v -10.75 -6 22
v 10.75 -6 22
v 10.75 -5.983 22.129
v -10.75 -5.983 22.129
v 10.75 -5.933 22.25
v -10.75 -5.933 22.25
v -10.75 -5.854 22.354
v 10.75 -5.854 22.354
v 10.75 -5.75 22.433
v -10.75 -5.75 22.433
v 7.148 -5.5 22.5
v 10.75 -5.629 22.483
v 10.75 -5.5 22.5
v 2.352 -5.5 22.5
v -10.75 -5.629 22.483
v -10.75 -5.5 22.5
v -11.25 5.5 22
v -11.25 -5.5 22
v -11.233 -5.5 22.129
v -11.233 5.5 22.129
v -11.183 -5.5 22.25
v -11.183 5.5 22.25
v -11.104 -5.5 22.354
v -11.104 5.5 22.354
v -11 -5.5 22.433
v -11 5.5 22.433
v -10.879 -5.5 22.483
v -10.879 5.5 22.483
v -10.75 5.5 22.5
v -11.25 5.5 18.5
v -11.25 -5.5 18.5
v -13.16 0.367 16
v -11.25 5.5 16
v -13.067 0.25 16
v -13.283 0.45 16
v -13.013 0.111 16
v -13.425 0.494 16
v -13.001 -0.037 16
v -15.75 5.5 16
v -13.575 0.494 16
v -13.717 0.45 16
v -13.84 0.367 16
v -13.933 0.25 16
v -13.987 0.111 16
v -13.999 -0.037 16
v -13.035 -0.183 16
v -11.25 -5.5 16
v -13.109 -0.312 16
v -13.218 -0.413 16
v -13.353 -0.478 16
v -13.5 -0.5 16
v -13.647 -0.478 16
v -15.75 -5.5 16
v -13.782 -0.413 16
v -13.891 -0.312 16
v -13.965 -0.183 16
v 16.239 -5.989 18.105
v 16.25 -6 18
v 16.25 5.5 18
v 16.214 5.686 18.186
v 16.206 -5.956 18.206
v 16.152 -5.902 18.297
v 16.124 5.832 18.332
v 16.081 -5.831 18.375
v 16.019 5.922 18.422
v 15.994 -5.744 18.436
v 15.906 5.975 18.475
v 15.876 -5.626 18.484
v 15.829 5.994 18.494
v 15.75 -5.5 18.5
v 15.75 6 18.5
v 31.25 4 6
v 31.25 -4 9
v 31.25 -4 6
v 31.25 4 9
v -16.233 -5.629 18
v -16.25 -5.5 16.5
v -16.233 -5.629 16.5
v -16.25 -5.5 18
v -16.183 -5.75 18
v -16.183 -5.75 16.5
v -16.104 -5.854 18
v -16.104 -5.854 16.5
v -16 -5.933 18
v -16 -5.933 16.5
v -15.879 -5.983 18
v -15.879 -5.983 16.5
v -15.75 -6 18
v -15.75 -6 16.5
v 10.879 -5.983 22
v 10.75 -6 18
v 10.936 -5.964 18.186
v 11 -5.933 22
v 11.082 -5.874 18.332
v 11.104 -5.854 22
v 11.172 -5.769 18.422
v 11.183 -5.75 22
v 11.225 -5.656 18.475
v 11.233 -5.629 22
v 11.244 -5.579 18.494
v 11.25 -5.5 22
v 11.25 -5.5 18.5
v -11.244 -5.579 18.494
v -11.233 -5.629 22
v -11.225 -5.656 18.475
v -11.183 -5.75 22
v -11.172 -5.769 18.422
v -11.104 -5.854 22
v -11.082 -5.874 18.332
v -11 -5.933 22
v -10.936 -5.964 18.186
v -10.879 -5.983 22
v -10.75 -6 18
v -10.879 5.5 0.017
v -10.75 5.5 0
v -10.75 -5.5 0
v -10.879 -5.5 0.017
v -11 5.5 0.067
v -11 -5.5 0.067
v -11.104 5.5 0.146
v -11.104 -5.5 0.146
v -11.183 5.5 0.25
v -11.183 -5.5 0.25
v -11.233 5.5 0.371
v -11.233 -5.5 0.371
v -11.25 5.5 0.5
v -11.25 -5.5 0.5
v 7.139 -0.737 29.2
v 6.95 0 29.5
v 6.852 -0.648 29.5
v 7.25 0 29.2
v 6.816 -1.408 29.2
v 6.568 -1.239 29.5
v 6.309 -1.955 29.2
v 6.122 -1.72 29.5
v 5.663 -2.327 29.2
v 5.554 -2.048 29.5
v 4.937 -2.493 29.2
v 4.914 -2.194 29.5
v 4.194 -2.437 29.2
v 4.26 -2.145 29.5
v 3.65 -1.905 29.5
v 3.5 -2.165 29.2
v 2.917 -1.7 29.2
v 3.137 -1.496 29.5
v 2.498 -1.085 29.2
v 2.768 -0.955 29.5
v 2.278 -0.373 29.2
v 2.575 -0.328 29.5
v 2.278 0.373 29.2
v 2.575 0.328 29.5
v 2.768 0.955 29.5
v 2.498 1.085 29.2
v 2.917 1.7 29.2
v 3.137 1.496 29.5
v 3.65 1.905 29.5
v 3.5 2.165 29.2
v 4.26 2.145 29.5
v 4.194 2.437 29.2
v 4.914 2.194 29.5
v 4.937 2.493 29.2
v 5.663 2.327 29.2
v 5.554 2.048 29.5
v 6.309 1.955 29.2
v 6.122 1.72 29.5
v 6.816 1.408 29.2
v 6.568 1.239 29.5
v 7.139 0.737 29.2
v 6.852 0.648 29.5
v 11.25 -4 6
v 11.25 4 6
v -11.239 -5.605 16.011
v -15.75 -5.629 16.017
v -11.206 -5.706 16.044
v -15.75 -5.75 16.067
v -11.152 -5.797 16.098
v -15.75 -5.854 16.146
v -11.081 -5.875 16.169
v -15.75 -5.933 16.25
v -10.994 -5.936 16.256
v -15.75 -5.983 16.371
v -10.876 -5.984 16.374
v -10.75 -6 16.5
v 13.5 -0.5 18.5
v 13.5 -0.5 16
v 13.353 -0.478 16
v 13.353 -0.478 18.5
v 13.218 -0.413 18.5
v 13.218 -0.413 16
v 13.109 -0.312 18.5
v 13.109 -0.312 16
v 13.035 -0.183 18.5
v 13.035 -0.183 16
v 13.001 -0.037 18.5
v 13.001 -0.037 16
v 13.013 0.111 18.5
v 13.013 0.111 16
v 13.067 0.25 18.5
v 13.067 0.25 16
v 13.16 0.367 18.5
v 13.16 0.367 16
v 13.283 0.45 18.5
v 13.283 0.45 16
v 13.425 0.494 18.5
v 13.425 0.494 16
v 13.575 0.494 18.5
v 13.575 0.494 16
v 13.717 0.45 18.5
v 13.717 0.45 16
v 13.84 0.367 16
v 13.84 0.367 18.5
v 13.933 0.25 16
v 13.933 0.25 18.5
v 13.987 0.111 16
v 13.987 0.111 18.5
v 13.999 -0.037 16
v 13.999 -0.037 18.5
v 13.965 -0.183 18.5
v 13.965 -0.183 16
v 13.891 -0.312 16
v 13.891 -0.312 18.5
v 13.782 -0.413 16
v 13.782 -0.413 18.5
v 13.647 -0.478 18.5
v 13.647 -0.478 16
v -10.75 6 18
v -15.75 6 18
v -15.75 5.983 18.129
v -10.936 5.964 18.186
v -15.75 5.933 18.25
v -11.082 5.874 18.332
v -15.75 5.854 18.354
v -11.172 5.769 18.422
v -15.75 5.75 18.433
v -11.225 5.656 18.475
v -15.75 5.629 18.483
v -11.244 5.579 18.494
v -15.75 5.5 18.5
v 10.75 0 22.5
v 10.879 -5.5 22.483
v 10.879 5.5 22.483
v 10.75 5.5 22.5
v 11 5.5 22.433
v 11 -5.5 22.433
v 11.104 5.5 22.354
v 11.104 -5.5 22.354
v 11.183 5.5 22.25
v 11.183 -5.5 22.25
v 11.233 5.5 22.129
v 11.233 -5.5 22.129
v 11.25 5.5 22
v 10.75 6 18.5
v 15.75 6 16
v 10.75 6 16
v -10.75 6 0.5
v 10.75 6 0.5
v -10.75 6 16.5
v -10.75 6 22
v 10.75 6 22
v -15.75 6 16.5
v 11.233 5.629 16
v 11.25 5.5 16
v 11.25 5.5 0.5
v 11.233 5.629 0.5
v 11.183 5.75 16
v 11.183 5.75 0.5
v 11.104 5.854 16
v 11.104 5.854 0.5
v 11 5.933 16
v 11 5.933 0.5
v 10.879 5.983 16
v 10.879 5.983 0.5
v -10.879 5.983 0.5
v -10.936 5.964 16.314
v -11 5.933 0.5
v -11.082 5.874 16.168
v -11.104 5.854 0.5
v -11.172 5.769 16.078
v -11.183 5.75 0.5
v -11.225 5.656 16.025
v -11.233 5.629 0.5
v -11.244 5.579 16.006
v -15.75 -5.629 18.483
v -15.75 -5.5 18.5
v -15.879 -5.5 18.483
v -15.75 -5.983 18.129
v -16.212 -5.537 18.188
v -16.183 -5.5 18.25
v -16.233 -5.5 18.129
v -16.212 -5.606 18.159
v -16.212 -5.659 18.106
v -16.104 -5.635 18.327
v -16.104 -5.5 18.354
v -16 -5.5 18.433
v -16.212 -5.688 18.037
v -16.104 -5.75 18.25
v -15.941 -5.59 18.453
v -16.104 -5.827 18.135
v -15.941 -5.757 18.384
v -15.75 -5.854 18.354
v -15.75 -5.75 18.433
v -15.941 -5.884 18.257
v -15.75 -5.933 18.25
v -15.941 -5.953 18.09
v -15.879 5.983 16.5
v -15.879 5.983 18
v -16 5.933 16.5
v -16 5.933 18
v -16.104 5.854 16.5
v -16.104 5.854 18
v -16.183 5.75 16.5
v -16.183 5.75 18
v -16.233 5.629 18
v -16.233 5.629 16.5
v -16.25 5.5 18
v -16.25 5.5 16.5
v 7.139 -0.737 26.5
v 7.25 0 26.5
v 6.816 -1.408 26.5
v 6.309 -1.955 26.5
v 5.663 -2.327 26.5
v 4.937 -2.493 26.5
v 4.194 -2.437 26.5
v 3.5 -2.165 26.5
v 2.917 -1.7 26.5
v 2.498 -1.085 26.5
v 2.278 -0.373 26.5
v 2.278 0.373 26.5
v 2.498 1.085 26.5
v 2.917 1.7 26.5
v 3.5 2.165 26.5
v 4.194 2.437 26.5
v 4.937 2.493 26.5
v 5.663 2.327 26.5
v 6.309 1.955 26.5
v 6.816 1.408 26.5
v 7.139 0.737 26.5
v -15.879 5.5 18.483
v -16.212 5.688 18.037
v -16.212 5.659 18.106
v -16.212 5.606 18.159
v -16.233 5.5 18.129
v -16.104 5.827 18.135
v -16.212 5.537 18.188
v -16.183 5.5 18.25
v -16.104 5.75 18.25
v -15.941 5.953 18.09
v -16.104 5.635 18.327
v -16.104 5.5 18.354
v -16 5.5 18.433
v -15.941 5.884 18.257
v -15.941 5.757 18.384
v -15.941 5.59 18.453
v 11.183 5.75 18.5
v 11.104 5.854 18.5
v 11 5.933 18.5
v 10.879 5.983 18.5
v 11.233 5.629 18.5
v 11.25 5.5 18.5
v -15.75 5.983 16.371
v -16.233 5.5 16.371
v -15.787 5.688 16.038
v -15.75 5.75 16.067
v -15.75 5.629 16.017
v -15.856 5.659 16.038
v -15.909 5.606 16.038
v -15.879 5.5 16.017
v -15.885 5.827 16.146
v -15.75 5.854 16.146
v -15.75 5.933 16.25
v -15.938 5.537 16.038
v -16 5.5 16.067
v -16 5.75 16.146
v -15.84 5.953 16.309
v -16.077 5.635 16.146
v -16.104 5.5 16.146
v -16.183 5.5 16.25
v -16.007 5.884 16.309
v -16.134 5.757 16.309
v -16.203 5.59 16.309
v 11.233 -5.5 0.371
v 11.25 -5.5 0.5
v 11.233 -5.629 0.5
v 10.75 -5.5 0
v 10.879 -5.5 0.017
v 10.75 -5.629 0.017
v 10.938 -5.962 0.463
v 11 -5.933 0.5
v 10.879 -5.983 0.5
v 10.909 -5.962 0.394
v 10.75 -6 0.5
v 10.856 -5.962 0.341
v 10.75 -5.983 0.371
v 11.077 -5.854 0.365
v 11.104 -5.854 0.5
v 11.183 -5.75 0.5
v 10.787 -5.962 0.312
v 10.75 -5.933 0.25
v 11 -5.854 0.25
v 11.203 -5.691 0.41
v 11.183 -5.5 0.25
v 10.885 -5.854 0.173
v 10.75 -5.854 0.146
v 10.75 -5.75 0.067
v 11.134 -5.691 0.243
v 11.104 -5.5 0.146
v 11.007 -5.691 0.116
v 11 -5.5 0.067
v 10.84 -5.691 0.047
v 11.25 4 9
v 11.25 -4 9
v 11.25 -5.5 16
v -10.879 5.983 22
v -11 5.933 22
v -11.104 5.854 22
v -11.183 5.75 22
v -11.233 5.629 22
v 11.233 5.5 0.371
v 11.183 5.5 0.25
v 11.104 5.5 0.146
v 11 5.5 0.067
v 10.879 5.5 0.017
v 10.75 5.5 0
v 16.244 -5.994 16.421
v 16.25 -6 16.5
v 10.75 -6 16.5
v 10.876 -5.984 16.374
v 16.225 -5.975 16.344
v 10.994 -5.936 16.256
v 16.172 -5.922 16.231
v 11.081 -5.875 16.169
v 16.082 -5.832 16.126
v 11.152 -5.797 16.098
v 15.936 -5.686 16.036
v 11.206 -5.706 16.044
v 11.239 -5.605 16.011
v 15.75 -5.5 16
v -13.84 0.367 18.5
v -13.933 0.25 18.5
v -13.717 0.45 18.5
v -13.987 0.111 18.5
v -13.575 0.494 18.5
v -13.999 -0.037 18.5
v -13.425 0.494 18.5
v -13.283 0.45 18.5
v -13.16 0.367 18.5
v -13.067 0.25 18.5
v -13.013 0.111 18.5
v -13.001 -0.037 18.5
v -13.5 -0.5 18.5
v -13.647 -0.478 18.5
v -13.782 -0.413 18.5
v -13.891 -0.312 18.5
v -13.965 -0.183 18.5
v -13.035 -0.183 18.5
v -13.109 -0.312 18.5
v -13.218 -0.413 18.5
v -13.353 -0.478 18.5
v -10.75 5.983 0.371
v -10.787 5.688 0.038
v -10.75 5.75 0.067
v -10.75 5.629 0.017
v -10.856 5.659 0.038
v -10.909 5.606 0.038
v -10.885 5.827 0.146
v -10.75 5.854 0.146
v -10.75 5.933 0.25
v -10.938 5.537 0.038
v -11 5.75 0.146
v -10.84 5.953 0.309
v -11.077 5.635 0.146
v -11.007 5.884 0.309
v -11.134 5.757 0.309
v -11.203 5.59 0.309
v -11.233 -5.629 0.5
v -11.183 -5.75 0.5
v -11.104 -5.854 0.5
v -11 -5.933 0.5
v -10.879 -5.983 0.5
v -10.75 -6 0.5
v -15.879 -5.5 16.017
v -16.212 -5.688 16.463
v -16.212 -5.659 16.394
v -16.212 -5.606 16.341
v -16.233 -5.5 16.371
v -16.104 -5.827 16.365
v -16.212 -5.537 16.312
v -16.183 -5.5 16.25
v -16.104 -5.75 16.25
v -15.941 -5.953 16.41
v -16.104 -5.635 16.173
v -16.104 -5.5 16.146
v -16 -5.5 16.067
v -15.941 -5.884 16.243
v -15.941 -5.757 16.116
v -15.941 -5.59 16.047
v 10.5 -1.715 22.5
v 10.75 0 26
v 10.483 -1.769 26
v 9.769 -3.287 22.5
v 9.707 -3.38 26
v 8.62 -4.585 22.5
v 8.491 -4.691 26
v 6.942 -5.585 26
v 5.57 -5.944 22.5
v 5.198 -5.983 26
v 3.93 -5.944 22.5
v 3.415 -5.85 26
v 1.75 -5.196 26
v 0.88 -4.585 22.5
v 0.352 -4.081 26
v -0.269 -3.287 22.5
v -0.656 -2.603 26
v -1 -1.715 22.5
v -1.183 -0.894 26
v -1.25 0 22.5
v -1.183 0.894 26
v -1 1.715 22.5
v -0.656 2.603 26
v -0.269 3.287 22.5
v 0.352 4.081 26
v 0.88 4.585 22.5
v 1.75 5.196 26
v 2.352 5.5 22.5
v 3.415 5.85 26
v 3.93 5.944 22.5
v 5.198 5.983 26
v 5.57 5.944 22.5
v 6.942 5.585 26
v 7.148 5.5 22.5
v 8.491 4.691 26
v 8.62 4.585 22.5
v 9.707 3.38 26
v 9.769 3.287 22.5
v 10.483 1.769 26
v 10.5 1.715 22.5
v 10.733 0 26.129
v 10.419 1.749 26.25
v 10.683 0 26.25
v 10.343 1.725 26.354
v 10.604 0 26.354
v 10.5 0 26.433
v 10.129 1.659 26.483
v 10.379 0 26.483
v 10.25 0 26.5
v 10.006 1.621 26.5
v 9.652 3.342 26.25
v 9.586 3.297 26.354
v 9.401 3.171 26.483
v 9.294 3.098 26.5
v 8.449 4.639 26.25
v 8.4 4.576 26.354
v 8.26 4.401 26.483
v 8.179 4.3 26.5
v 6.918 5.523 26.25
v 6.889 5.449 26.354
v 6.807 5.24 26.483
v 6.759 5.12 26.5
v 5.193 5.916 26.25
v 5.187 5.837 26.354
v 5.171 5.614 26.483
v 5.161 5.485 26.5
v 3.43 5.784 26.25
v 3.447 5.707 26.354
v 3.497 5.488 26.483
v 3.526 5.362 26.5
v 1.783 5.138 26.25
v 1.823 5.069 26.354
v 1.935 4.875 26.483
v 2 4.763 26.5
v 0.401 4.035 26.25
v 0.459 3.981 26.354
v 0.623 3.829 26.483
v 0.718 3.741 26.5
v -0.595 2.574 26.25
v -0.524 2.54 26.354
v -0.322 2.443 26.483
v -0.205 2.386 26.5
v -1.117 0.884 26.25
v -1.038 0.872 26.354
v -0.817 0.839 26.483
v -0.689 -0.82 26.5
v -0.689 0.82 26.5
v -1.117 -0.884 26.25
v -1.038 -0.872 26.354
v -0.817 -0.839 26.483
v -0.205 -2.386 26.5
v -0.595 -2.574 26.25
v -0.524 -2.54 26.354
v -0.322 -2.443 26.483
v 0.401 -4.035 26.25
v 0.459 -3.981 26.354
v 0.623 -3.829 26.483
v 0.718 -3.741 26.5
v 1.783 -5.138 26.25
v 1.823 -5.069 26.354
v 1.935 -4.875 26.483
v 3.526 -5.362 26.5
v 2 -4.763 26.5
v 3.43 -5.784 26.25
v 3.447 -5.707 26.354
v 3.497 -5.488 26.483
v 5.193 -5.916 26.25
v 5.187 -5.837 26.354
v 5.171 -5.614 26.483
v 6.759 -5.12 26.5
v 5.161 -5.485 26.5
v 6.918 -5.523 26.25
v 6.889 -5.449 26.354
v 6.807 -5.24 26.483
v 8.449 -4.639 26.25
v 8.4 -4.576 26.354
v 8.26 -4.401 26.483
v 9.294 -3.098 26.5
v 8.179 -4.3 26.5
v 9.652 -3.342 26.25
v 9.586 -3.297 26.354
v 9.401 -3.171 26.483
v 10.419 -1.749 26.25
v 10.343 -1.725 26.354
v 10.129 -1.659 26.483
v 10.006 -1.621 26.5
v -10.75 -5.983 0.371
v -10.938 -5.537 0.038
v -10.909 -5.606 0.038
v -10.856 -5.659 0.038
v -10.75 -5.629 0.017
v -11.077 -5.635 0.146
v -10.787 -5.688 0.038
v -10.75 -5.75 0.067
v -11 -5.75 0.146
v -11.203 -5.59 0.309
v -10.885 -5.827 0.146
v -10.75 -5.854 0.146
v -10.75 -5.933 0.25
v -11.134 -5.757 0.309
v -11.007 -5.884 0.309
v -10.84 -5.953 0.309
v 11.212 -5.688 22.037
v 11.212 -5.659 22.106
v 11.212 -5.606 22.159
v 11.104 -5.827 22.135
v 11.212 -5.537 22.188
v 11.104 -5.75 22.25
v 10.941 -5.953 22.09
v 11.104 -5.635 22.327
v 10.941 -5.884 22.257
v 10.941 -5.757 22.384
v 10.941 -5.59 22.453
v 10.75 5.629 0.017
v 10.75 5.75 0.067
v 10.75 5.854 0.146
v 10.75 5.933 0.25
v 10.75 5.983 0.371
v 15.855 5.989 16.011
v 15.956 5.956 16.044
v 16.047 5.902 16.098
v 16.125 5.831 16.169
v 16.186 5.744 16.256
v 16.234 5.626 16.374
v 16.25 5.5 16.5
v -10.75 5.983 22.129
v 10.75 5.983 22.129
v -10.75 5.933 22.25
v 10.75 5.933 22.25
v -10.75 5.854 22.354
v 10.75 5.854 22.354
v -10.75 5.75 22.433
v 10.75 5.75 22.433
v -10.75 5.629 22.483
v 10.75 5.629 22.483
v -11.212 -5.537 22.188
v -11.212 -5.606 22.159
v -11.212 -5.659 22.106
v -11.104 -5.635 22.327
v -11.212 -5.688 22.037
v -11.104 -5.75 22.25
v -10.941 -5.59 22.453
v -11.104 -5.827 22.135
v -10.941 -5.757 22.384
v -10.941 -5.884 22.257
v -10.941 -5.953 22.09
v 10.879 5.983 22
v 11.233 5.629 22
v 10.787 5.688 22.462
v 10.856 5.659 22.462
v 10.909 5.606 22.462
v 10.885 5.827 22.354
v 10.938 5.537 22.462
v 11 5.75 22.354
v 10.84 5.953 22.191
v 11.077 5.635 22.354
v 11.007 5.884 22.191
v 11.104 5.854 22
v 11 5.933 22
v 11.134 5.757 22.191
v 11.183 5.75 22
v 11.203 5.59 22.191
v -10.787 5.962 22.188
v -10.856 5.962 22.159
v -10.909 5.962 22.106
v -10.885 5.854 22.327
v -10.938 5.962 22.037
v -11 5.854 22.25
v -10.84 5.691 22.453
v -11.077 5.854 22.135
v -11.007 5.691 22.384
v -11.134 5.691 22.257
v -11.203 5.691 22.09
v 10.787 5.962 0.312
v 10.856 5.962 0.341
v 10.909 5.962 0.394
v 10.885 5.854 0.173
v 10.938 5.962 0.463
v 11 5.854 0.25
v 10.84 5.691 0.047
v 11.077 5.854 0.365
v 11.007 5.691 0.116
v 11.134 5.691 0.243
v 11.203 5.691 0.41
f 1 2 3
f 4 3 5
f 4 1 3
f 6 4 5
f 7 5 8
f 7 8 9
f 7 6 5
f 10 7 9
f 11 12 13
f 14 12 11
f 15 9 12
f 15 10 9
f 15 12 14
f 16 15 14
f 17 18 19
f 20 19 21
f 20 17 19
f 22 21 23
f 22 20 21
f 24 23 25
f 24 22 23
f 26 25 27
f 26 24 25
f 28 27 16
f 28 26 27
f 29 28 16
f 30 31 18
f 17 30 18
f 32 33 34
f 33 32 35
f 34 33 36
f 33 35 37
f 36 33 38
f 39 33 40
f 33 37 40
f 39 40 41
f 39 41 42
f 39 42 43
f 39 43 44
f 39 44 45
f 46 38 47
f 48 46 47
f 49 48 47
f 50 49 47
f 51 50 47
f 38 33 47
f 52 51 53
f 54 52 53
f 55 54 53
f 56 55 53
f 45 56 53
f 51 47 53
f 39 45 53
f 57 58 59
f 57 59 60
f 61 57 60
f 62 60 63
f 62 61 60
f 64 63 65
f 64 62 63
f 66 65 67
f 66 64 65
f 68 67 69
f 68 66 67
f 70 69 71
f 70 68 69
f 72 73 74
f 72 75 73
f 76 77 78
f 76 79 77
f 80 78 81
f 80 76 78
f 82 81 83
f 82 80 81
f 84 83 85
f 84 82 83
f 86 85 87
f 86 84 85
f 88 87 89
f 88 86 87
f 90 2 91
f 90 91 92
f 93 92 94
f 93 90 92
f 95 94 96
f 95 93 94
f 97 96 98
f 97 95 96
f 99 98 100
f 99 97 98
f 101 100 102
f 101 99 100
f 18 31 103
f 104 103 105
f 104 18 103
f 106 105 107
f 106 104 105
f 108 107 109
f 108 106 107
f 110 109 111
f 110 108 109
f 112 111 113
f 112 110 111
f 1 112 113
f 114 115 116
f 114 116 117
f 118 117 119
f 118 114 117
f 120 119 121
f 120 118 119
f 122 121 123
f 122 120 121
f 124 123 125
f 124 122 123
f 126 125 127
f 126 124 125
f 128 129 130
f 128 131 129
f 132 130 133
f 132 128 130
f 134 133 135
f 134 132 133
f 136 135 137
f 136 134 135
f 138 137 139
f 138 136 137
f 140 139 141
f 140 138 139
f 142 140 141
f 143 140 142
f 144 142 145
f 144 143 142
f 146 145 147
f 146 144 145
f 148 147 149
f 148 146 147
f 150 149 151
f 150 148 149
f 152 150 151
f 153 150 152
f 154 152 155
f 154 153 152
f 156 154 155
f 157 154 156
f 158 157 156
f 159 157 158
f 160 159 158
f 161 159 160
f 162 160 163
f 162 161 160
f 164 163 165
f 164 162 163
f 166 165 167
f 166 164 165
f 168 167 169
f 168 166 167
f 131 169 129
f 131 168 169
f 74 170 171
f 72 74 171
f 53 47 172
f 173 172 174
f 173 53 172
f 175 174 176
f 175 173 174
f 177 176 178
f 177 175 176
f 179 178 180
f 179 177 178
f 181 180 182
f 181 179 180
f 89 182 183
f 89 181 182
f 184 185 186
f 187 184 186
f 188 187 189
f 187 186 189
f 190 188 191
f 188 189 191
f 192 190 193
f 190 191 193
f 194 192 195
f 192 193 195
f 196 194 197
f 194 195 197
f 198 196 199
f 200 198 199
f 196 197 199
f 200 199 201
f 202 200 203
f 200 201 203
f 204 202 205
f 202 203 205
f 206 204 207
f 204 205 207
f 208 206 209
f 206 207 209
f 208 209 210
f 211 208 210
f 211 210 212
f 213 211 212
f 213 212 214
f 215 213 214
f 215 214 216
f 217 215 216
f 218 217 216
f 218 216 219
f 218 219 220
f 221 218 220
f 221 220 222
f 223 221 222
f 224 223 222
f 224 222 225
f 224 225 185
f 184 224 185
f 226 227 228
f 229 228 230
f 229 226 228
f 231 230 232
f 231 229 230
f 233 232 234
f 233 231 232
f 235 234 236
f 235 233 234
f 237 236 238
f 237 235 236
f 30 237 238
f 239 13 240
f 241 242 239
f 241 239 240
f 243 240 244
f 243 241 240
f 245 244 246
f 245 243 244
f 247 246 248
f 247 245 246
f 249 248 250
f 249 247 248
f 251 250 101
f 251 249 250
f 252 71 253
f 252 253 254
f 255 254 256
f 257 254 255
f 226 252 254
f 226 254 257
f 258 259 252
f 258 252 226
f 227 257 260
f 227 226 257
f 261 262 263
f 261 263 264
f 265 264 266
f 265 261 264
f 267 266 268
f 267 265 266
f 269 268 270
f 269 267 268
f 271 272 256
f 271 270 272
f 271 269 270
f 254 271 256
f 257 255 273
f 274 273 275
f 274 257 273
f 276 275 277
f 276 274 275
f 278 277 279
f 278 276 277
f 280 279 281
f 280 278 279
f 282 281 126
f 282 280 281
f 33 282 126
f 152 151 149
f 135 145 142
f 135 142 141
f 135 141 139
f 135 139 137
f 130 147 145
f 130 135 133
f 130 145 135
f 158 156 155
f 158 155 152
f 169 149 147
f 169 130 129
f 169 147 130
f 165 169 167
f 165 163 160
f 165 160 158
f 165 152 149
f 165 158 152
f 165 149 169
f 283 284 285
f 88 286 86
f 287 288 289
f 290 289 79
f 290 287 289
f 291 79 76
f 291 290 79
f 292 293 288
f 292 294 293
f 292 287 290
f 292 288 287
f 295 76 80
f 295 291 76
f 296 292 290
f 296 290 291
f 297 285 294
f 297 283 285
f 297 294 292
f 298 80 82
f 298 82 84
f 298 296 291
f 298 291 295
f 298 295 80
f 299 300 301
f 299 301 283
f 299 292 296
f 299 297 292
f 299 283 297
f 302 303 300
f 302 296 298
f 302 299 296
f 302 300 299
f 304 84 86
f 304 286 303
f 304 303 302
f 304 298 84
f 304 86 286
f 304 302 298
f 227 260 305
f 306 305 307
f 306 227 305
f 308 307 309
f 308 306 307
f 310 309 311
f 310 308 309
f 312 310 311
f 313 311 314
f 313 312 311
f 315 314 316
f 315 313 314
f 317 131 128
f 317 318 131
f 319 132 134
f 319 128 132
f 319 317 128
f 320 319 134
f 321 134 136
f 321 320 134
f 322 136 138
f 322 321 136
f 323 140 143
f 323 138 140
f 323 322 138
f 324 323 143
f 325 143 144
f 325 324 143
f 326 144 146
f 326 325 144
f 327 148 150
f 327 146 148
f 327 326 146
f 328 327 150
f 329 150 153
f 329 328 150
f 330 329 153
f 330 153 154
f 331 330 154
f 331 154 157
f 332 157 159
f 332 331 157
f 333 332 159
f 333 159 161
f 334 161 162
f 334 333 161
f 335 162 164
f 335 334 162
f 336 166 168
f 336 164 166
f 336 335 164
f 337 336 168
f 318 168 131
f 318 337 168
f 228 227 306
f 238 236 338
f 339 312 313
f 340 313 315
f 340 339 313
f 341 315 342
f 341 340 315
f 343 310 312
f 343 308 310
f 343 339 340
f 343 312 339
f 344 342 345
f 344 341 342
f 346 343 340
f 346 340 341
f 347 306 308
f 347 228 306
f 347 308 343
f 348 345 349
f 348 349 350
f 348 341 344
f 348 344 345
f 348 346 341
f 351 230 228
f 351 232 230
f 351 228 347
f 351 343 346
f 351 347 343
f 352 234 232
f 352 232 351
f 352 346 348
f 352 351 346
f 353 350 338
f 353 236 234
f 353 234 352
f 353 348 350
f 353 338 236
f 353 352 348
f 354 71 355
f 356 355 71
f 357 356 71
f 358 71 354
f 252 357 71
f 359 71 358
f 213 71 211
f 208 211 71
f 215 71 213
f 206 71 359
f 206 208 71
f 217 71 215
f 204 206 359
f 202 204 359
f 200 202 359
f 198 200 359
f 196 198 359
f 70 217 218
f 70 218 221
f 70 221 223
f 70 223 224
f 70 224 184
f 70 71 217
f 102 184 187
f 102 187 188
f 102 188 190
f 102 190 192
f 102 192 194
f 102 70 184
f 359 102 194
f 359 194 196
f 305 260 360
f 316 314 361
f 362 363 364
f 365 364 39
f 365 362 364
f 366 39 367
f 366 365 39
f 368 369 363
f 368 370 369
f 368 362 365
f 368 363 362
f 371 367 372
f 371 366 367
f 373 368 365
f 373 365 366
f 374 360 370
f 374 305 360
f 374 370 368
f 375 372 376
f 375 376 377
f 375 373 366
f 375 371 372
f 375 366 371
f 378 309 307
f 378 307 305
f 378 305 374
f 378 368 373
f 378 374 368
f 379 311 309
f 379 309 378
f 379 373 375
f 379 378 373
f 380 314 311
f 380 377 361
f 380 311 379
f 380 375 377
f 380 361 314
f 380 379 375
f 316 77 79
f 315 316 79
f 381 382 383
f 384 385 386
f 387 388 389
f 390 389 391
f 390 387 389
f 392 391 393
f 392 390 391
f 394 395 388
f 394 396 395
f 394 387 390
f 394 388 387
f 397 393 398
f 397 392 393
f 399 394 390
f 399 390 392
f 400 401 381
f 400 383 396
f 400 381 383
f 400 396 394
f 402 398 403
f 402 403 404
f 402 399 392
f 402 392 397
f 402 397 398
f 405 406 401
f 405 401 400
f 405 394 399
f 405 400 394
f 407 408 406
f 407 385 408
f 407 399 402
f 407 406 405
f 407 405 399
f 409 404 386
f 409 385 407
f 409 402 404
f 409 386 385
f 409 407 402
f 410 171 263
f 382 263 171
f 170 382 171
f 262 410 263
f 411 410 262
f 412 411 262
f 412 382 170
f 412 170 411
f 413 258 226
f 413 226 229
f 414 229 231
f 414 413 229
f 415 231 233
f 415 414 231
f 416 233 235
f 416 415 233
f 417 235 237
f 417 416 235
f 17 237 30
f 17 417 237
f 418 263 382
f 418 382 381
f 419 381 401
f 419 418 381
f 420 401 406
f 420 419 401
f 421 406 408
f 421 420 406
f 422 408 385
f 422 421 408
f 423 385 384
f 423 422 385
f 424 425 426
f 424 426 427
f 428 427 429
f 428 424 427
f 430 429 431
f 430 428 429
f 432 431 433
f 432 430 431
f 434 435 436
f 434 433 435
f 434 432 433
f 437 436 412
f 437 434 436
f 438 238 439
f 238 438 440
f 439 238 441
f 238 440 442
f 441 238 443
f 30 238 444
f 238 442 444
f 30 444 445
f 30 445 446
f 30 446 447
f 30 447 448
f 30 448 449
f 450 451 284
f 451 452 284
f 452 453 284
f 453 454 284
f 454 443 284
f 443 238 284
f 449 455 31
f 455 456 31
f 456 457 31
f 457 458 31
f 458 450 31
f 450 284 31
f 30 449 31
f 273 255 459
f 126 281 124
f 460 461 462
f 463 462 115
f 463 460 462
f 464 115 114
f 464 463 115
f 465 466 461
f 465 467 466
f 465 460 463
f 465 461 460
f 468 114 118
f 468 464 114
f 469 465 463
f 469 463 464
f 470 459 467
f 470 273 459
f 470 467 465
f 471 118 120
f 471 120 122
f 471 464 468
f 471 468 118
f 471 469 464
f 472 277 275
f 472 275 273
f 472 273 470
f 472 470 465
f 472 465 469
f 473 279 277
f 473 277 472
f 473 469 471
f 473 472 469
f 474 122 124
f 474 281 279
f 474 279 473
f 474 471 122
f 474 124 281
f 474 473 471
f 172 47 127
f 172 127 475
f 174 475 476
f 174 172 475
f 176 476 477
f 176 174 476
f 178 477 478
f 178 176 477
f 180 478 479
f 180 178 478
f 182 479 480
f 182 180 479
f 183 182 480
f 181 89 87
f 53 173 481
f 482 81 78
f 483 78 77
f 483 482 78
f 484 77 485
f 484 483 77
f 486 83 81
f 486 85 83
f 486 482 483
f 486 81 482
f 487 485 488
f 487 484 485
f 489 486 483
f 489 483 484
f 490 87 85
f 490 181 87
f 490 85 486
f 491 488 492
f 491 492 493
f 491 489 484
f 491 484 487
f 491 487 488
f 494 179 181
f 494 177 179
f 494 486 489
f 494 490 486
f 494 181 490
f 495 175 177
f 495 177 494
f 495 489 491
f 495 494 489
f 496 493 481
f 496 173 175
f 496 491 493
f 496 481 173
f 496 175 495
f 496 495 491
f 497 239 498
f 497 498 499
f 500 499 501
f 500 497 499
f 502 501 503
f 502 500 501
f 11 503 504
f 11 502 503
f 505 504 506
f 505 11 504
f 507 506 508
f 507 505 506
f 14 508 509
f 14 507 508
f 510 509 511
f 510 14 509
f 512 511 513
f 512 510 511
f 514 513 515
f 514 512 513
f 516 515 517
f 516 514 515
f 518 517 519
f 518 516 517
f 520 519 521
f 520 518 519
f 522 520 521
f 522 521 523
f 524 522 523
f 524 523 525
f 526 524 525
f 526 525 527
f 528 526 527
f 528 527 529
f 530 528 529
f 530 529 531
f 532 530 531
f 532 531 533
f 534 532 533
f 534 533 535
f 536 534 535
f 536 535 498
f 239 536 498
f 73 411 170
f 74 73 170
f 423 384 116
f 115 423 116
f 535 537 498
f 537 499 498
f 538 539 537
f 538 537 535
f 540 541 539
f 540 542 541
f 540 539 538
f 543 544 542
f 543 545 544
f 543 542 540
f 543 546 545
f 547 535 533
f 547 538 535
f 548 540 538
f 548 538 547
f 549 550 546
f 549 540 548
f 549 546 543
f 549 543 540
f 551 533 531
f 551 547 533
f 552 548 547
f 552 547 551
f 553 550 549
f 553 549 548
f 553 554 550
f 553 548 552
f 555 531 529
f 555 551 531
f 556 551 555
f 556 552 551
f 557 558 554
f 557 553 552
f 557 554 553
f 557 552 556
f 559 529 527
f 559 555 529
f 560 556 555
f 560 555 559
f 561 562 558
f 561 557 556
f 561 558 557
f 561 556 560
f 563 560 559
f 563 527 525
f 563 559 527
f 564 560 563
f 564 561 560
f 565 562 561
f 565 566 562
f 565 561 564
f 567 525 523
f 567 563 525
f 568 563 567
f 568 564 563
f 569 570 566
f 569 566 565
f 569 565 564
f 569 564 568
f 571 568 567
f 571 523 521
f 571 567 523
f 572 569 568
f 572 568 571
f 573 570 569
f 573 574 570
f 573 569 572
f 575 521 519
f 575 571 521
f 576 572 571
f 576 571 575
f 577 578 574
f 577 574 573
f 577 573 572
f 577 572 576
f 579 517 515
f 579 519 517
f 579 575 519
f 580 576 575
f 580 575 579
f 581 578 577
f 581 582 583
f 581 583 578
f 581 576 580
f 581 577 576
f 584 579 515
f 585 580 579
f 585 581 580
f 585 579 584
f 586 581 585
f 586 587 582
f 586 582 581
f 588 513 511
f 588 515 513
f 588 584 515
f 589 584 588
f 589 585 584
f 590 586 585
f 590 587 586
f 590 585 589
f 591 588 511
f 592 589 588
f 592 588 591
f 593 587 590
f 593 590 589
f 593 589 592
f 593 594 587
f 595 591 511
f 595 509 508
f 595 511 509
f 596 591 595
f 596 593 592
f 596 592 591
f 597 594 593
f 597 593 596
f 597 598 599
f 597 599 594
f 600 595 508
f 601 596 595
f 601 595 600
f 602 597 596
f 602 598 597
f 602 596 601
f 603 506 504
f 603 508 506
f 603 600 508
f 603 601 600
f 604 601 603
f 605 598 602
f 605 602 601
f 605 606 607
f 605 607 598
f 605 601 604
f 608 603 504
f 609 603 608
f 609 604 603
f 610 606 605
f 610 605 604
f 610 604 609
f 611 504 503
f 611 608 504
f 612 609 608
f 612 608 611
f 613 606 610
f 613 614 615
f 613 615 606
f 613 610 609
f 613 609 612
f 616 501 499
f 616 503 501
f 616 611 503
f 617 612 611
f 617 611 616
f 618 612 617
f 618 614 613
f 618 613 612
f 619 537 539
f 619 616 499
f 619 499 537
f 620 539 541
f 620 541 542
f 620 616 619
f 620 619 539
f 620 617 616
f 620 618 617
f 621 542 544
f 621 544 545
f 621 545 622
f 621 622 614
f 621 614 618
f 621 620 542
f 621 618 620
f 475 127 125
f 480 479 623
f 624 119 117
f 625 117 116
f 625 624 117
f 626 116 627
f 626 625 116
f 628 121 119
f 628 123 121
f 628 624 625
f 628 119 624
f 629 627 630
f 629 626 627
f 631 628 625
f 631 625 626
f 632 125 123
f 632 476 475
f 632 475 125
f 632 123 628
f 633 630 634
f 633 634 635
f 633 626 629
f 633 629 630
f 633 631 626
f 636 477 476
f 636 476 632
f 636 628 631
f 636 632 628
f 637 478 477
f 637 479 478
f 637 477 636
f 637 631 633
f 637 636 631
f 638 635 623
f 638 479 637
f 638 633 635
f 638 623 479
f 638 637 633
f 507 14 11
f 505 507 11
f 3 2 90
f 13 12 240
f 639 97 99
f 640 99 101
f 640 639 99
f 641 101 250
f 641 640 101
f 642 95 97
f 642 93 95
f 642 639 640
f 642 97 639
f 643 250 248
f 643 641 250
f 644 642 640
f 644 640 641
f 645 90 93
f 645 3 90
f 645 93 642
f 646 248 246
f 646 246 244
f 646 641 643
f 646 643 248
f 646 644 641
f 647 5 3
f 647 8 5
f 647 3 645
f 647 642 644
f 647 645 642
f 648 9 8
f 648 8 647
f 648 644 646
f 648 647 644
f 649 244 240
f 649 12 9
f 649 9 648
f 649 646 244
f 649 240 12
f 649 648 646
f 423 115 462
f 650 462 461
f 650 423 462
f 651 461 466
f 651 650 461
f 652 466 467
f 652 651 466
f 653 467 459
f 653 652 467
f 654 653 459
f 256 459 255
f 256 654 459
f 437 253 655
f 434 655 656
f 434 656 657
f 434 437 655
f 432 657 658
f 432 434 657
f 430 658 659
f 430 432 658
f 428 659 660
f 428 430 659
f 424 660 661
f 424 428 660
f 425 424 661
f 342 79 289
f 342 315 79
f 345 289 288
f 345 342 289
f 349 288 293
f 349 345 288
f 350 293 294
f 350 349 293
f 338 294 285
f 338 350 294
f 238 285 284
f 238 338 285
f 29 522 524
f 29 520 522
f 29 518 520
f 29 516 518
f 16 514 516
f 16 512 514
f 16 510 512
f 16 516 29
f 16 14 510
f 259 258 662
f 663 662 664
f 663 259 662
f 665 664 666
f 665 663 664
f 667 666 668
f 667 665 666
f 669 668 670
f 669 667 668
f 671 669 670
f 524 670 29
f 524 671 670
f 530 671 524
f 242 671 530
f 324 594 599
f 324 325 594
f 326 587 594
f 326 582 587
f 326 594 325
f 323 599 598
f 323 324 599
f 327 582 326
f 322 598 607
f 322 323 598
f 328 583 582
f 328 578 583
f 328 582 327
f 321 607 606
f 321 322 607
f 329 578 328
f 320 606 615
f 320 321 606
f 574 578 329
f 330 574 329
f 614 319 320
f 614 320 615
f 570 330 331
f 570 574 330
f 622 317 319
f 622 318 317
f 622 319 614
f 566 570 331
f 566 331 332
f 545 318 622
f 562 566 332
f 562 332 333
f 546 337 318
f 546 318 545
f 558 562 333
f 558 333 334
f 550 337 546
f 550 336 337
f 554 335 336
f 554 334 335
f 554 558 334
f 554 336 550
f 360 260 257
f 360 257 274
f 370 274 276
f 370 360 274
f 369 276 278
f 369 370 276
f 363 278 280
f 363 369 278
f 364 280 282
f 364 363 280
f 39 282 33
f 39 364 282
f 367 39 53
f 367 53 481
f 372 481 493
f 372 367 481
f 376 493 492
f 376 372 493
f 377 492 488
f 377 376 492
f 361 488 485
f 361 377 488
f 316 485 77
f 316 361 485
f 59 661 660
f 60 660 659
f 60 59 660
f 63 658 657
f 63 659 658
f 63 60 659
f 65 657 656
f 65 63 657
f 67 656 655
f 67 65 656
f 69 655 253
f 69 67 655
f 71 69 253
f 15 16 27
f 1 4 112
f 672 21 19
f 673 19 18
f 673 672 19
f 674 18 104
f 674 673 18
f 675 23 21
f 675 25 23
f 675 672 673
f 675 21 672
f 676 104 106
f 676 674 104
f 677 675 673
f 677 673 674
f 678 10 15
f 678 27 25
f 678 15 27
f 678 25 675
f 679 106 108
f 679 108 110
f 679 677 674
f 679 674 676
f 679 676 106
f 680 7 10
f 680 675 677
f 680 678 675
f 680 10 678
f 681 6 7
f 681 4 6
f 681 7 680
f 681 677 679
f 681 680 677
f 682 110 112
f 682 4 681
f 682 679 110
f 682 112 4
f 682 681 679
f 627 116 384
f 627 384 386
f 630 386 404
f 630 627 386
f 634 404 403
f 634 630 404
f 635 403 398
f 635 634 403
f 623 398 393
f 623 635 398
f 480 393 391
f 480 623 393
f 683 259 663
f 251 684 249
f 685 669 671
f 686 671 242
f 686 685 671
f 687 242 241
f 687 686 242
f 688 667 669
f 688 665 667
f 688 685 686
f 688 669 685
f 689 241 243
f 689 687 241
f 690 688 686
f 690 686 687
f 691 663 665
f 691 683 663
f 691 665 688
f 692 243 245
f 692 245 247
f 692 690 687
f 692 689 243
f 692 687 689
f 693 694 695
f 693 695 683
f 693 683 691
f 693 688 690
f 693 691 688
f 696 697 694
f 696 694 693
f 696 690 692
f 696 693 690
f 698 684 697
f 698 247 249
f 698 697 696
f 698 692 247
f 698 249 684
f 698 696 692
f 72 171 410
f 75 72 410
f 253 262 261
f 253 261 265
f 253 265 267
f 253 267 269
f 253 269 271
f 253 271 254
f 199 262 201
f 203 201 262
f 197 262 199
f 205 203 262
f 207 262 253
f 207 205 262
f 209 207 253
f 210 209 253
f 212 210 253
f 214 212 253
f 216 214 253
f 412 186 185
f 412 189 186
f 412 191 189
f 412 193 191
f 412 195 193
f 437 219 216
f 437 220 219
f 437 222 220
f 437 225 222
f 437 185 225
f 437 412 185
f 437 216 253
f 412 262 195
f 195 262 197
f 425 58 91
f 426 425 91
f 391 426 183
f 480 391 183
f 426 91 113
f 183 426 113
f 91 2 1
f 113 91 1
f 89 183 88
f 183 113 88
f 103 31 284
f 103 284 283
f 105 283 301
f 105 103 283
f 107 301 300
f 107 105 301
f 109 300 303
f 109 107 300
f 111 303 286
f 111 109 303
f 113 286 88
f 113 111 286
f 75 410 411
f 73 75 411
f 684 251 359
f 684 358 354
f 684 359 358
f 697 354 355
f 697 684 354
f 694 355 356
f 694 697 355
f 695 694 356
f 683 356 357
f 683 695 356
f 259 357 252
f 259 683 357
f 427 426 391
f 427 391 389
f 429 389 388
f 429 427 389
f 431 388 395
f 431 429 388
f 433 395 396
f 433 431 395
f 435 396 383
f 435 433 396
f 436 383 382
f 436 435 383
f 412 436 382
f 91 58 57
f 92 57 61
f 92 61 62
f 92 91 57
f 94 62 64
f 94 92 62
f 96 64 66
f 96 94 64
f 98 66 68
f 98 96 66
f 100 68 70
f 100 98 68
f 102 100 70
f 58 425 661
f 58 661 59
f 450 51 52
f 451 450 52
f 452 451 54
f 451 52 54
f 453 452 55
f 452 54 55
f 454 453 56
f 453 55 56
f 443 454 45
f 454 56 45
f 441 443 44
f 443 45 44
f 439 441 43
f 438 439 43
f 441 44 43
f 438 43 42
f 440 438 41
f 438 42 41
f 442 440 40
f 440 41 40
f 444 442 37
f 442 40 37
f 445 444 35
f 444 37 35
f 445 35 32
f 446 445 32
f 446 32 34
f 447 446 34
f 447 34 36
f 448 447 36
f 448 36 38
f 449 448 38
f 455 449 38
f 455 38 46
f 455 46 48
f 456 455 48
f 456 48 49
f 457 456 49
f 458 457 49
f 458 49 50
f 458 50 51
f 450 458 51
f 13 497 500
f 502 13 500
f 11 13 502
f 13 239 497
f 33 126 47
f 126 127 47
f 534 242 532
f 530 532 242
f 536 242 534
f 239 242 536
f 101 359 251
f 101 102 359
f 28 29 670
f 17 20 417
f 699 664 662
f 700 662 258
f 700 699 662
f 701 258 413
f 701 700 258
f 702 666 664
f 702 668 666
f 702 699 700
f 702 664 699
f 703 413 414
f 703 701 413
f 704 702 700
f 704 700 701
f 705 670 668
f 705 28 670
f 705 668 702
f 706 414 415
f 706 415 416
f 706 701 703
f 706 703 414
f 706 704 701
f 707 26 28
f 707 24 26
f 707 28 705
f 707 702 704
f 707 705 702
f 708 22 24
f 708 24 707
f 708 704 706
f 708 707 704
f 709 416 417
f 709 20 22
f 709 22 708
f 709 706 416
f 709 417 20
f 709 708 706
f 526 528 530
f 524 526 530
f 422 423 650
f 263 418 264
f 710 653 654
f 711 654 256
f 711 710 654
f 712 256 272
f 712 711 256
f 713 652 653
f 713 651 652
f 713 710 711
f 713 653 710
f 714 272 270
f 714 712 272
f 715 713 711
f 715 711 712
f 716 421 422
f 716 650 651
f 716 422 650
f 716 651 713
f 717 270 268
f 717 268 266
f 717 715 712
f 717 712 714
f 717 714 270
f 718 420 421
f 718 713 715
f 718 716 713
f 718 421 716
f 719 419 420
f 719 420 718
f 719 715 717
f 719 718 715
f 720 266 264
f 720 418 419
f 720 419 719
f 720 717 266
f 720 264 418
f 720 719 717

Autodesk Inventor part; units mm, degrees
ref_plane "YZ Plane" through (0, 0, 0) normal (1, 0, 0) x (0, 1, 0)
ref_plane "XZ Plane" through (0, 0, 0) normal (0, 1, 0) x (-1, 0, 0)
ref_plane "XY Plane" through (0, 0, 0) normal (0, 0, 1) x (1, 0, 0)
sketch "Skizze1" plane through (0, 0, 0) normal (0, 1, 0) x (-1, 0, 0)
  line L0 (-11.25, 0) -> (11.25, 0)
  line L1 (11.25, 0) -> (11.25, 16)
  line L2 (11.25, 16) -> (16.25, 16)
  line L3 (16.25, 16) -> (16.25, 18.5)
  line L4 (16.25, 18.5) -> (11.25, 18.5)
  line L5 (11.25, 18.5) -> (11.25, 22.5)
  line L6 (11.25, 22.5) -> (0, 22.5)
  line L7 (0, -4.5) -> (0, 27) projected
  line L8 (-11.25, 0) -> (-11.25, 16)
  line L9 (-11.25, 16) -> (-16.25, 16)
  line L10 (-16.25, 16) -> (-16.25, 18.5)
  line L11 (-16.25, 18.5) -> (-11.25, 18.5)
  line L12 (-11.25, 18.5) -> (-11.25, 22.5)
  line L13 (-11.25, 22.5) -> (0, 22.5)
  point P0 (0, 0)
  dimension "d0" = 22.5
  dimension "d1" = 16
  dimension "d2" = 5
  dimension "d3" = 2.5
  dimension "d4" = 4
  dimension "d5" = 0
extrude "Extrusion1" add sketch "Skizze1" along normal mid plane 12
fillet "Rundung1" radius 0.5 29 edges at (0, -6, 22.5) (11.25, 0, 0) (11.25, -6, 8) (11.25, -6, 20.5) (11.25, 6, 20.5) (-11.25, 0, 22.5) (11.25, 0, 22.5) (0, 6, 22.5) (-11.25, -6, 8) (-11.25, -6, 20.5) (-13.75, -6, 18.5) (-13.75, -6, 16) (-16.25, -6, 17.25) (13.75, -6, 18.5) (13.75, -6, 16) (16.25, 0, 16) (16.25, 0, 18.5) (16.25, 6, 17.25) (11.25, 6, 8) (-11.25, 6, 20.5) (-13.75, 6, 18.5) (-16.25, 6, 17.25) (-16.25, 0, 18.5) (-16.25, 0, 16) (-13.75, 6, 16) (-11.25, 6, 8) (-11.25, 0, 0) (0, 6, 0) (0, -6, 0)
sketch "Skizze2" plane through (-10.75, 5.5, 22.5) normal (0, 0, 1) x (1, 0, 0)
  circle A0 centre (15.5, -5.5) radius 6
  line L0 (21.5, 0) -> (21.5, -11) projected
  line L1 (21.5, 0.5) -> (0, 0.5) projected
  point P0 (10.75, -5.5)
  point P1 (21.5, -5.5)
  point P2 (21.5, -5.5)
  dimension "d9" = 6
extrude "Extrusion2" add sketch "Skizze2" along normal blind 4
sketch "Skizze3" plane through (4.75, 0, 26.5) normal (0, 0, 1) x (1, 0, 0)
  circle A0 centre (0, 0) radius 2.5
  arc A1 (2.3979, 5.5) -> (-2.3979, 5.5) centre (0, 0) ccw projected
  point P0 (0, 6)
  point P1 (6, 0)
  dimension "d14" = 5
extrude "Extrusion3" add sketch "Skizze3" along normal blind 3
fillet "Rundung2" radius 0.5 1 edges at (-1.25, 0, 26.5)
chamfer "Fasen1" distance 0.3 angle 45 1 edges at (2.25, 0, 29.5)
sketch "Skizze4" plane through (11.25, -5.5, 0.5) normal (1, 0, 0) x (0, 0, -1)
  line L0 (-8.5, 1.5) -> (-5.5, 1.5)
  line L1 (-5.5, 1.5) -> (-5.5, 9.5)
  line L2 (-5.5, 9.5) -> (-8.5, 9.5)
  line L3 (-8.5, 9.5) -> (-8.5, 1.5)
  line L4 (0.5, 0) -> (0.5, 11) projected
  point P0 (0.5, 5.5)
  point P1 (-5.5, 5.5)
  point P2 (0.5, 5.5)
  dimension "d21" = 8
  dimension "d22" = 3
  dimension "d23" = 6
extrude "Extrusion4" add sketch "Skizze4" along normal blind 20
sketch "Skizze5" plane through (10.75, 6, 18.5) normal (0, 0, 1) x (1, 0, 0)
  circle A0 centre (-6, -6) radius 2.2 projected
  line L0 (-26.5, -0.5) -> (-22, -0.5) projected
  point P0 (-10.75, -6)
  point P1 (2.75, -6)
  point P2 (-24.25, -6)
  point P3 (-24.25, -0.5)
  dimension "d26" = 27
hole "Bohrung1" at (13.5, 0, 18.5) at (-13.5, 0, 18.5) direction (0, 0, -1) diameter 1 depth 8 tip angle 118
properties part number "Motor"
